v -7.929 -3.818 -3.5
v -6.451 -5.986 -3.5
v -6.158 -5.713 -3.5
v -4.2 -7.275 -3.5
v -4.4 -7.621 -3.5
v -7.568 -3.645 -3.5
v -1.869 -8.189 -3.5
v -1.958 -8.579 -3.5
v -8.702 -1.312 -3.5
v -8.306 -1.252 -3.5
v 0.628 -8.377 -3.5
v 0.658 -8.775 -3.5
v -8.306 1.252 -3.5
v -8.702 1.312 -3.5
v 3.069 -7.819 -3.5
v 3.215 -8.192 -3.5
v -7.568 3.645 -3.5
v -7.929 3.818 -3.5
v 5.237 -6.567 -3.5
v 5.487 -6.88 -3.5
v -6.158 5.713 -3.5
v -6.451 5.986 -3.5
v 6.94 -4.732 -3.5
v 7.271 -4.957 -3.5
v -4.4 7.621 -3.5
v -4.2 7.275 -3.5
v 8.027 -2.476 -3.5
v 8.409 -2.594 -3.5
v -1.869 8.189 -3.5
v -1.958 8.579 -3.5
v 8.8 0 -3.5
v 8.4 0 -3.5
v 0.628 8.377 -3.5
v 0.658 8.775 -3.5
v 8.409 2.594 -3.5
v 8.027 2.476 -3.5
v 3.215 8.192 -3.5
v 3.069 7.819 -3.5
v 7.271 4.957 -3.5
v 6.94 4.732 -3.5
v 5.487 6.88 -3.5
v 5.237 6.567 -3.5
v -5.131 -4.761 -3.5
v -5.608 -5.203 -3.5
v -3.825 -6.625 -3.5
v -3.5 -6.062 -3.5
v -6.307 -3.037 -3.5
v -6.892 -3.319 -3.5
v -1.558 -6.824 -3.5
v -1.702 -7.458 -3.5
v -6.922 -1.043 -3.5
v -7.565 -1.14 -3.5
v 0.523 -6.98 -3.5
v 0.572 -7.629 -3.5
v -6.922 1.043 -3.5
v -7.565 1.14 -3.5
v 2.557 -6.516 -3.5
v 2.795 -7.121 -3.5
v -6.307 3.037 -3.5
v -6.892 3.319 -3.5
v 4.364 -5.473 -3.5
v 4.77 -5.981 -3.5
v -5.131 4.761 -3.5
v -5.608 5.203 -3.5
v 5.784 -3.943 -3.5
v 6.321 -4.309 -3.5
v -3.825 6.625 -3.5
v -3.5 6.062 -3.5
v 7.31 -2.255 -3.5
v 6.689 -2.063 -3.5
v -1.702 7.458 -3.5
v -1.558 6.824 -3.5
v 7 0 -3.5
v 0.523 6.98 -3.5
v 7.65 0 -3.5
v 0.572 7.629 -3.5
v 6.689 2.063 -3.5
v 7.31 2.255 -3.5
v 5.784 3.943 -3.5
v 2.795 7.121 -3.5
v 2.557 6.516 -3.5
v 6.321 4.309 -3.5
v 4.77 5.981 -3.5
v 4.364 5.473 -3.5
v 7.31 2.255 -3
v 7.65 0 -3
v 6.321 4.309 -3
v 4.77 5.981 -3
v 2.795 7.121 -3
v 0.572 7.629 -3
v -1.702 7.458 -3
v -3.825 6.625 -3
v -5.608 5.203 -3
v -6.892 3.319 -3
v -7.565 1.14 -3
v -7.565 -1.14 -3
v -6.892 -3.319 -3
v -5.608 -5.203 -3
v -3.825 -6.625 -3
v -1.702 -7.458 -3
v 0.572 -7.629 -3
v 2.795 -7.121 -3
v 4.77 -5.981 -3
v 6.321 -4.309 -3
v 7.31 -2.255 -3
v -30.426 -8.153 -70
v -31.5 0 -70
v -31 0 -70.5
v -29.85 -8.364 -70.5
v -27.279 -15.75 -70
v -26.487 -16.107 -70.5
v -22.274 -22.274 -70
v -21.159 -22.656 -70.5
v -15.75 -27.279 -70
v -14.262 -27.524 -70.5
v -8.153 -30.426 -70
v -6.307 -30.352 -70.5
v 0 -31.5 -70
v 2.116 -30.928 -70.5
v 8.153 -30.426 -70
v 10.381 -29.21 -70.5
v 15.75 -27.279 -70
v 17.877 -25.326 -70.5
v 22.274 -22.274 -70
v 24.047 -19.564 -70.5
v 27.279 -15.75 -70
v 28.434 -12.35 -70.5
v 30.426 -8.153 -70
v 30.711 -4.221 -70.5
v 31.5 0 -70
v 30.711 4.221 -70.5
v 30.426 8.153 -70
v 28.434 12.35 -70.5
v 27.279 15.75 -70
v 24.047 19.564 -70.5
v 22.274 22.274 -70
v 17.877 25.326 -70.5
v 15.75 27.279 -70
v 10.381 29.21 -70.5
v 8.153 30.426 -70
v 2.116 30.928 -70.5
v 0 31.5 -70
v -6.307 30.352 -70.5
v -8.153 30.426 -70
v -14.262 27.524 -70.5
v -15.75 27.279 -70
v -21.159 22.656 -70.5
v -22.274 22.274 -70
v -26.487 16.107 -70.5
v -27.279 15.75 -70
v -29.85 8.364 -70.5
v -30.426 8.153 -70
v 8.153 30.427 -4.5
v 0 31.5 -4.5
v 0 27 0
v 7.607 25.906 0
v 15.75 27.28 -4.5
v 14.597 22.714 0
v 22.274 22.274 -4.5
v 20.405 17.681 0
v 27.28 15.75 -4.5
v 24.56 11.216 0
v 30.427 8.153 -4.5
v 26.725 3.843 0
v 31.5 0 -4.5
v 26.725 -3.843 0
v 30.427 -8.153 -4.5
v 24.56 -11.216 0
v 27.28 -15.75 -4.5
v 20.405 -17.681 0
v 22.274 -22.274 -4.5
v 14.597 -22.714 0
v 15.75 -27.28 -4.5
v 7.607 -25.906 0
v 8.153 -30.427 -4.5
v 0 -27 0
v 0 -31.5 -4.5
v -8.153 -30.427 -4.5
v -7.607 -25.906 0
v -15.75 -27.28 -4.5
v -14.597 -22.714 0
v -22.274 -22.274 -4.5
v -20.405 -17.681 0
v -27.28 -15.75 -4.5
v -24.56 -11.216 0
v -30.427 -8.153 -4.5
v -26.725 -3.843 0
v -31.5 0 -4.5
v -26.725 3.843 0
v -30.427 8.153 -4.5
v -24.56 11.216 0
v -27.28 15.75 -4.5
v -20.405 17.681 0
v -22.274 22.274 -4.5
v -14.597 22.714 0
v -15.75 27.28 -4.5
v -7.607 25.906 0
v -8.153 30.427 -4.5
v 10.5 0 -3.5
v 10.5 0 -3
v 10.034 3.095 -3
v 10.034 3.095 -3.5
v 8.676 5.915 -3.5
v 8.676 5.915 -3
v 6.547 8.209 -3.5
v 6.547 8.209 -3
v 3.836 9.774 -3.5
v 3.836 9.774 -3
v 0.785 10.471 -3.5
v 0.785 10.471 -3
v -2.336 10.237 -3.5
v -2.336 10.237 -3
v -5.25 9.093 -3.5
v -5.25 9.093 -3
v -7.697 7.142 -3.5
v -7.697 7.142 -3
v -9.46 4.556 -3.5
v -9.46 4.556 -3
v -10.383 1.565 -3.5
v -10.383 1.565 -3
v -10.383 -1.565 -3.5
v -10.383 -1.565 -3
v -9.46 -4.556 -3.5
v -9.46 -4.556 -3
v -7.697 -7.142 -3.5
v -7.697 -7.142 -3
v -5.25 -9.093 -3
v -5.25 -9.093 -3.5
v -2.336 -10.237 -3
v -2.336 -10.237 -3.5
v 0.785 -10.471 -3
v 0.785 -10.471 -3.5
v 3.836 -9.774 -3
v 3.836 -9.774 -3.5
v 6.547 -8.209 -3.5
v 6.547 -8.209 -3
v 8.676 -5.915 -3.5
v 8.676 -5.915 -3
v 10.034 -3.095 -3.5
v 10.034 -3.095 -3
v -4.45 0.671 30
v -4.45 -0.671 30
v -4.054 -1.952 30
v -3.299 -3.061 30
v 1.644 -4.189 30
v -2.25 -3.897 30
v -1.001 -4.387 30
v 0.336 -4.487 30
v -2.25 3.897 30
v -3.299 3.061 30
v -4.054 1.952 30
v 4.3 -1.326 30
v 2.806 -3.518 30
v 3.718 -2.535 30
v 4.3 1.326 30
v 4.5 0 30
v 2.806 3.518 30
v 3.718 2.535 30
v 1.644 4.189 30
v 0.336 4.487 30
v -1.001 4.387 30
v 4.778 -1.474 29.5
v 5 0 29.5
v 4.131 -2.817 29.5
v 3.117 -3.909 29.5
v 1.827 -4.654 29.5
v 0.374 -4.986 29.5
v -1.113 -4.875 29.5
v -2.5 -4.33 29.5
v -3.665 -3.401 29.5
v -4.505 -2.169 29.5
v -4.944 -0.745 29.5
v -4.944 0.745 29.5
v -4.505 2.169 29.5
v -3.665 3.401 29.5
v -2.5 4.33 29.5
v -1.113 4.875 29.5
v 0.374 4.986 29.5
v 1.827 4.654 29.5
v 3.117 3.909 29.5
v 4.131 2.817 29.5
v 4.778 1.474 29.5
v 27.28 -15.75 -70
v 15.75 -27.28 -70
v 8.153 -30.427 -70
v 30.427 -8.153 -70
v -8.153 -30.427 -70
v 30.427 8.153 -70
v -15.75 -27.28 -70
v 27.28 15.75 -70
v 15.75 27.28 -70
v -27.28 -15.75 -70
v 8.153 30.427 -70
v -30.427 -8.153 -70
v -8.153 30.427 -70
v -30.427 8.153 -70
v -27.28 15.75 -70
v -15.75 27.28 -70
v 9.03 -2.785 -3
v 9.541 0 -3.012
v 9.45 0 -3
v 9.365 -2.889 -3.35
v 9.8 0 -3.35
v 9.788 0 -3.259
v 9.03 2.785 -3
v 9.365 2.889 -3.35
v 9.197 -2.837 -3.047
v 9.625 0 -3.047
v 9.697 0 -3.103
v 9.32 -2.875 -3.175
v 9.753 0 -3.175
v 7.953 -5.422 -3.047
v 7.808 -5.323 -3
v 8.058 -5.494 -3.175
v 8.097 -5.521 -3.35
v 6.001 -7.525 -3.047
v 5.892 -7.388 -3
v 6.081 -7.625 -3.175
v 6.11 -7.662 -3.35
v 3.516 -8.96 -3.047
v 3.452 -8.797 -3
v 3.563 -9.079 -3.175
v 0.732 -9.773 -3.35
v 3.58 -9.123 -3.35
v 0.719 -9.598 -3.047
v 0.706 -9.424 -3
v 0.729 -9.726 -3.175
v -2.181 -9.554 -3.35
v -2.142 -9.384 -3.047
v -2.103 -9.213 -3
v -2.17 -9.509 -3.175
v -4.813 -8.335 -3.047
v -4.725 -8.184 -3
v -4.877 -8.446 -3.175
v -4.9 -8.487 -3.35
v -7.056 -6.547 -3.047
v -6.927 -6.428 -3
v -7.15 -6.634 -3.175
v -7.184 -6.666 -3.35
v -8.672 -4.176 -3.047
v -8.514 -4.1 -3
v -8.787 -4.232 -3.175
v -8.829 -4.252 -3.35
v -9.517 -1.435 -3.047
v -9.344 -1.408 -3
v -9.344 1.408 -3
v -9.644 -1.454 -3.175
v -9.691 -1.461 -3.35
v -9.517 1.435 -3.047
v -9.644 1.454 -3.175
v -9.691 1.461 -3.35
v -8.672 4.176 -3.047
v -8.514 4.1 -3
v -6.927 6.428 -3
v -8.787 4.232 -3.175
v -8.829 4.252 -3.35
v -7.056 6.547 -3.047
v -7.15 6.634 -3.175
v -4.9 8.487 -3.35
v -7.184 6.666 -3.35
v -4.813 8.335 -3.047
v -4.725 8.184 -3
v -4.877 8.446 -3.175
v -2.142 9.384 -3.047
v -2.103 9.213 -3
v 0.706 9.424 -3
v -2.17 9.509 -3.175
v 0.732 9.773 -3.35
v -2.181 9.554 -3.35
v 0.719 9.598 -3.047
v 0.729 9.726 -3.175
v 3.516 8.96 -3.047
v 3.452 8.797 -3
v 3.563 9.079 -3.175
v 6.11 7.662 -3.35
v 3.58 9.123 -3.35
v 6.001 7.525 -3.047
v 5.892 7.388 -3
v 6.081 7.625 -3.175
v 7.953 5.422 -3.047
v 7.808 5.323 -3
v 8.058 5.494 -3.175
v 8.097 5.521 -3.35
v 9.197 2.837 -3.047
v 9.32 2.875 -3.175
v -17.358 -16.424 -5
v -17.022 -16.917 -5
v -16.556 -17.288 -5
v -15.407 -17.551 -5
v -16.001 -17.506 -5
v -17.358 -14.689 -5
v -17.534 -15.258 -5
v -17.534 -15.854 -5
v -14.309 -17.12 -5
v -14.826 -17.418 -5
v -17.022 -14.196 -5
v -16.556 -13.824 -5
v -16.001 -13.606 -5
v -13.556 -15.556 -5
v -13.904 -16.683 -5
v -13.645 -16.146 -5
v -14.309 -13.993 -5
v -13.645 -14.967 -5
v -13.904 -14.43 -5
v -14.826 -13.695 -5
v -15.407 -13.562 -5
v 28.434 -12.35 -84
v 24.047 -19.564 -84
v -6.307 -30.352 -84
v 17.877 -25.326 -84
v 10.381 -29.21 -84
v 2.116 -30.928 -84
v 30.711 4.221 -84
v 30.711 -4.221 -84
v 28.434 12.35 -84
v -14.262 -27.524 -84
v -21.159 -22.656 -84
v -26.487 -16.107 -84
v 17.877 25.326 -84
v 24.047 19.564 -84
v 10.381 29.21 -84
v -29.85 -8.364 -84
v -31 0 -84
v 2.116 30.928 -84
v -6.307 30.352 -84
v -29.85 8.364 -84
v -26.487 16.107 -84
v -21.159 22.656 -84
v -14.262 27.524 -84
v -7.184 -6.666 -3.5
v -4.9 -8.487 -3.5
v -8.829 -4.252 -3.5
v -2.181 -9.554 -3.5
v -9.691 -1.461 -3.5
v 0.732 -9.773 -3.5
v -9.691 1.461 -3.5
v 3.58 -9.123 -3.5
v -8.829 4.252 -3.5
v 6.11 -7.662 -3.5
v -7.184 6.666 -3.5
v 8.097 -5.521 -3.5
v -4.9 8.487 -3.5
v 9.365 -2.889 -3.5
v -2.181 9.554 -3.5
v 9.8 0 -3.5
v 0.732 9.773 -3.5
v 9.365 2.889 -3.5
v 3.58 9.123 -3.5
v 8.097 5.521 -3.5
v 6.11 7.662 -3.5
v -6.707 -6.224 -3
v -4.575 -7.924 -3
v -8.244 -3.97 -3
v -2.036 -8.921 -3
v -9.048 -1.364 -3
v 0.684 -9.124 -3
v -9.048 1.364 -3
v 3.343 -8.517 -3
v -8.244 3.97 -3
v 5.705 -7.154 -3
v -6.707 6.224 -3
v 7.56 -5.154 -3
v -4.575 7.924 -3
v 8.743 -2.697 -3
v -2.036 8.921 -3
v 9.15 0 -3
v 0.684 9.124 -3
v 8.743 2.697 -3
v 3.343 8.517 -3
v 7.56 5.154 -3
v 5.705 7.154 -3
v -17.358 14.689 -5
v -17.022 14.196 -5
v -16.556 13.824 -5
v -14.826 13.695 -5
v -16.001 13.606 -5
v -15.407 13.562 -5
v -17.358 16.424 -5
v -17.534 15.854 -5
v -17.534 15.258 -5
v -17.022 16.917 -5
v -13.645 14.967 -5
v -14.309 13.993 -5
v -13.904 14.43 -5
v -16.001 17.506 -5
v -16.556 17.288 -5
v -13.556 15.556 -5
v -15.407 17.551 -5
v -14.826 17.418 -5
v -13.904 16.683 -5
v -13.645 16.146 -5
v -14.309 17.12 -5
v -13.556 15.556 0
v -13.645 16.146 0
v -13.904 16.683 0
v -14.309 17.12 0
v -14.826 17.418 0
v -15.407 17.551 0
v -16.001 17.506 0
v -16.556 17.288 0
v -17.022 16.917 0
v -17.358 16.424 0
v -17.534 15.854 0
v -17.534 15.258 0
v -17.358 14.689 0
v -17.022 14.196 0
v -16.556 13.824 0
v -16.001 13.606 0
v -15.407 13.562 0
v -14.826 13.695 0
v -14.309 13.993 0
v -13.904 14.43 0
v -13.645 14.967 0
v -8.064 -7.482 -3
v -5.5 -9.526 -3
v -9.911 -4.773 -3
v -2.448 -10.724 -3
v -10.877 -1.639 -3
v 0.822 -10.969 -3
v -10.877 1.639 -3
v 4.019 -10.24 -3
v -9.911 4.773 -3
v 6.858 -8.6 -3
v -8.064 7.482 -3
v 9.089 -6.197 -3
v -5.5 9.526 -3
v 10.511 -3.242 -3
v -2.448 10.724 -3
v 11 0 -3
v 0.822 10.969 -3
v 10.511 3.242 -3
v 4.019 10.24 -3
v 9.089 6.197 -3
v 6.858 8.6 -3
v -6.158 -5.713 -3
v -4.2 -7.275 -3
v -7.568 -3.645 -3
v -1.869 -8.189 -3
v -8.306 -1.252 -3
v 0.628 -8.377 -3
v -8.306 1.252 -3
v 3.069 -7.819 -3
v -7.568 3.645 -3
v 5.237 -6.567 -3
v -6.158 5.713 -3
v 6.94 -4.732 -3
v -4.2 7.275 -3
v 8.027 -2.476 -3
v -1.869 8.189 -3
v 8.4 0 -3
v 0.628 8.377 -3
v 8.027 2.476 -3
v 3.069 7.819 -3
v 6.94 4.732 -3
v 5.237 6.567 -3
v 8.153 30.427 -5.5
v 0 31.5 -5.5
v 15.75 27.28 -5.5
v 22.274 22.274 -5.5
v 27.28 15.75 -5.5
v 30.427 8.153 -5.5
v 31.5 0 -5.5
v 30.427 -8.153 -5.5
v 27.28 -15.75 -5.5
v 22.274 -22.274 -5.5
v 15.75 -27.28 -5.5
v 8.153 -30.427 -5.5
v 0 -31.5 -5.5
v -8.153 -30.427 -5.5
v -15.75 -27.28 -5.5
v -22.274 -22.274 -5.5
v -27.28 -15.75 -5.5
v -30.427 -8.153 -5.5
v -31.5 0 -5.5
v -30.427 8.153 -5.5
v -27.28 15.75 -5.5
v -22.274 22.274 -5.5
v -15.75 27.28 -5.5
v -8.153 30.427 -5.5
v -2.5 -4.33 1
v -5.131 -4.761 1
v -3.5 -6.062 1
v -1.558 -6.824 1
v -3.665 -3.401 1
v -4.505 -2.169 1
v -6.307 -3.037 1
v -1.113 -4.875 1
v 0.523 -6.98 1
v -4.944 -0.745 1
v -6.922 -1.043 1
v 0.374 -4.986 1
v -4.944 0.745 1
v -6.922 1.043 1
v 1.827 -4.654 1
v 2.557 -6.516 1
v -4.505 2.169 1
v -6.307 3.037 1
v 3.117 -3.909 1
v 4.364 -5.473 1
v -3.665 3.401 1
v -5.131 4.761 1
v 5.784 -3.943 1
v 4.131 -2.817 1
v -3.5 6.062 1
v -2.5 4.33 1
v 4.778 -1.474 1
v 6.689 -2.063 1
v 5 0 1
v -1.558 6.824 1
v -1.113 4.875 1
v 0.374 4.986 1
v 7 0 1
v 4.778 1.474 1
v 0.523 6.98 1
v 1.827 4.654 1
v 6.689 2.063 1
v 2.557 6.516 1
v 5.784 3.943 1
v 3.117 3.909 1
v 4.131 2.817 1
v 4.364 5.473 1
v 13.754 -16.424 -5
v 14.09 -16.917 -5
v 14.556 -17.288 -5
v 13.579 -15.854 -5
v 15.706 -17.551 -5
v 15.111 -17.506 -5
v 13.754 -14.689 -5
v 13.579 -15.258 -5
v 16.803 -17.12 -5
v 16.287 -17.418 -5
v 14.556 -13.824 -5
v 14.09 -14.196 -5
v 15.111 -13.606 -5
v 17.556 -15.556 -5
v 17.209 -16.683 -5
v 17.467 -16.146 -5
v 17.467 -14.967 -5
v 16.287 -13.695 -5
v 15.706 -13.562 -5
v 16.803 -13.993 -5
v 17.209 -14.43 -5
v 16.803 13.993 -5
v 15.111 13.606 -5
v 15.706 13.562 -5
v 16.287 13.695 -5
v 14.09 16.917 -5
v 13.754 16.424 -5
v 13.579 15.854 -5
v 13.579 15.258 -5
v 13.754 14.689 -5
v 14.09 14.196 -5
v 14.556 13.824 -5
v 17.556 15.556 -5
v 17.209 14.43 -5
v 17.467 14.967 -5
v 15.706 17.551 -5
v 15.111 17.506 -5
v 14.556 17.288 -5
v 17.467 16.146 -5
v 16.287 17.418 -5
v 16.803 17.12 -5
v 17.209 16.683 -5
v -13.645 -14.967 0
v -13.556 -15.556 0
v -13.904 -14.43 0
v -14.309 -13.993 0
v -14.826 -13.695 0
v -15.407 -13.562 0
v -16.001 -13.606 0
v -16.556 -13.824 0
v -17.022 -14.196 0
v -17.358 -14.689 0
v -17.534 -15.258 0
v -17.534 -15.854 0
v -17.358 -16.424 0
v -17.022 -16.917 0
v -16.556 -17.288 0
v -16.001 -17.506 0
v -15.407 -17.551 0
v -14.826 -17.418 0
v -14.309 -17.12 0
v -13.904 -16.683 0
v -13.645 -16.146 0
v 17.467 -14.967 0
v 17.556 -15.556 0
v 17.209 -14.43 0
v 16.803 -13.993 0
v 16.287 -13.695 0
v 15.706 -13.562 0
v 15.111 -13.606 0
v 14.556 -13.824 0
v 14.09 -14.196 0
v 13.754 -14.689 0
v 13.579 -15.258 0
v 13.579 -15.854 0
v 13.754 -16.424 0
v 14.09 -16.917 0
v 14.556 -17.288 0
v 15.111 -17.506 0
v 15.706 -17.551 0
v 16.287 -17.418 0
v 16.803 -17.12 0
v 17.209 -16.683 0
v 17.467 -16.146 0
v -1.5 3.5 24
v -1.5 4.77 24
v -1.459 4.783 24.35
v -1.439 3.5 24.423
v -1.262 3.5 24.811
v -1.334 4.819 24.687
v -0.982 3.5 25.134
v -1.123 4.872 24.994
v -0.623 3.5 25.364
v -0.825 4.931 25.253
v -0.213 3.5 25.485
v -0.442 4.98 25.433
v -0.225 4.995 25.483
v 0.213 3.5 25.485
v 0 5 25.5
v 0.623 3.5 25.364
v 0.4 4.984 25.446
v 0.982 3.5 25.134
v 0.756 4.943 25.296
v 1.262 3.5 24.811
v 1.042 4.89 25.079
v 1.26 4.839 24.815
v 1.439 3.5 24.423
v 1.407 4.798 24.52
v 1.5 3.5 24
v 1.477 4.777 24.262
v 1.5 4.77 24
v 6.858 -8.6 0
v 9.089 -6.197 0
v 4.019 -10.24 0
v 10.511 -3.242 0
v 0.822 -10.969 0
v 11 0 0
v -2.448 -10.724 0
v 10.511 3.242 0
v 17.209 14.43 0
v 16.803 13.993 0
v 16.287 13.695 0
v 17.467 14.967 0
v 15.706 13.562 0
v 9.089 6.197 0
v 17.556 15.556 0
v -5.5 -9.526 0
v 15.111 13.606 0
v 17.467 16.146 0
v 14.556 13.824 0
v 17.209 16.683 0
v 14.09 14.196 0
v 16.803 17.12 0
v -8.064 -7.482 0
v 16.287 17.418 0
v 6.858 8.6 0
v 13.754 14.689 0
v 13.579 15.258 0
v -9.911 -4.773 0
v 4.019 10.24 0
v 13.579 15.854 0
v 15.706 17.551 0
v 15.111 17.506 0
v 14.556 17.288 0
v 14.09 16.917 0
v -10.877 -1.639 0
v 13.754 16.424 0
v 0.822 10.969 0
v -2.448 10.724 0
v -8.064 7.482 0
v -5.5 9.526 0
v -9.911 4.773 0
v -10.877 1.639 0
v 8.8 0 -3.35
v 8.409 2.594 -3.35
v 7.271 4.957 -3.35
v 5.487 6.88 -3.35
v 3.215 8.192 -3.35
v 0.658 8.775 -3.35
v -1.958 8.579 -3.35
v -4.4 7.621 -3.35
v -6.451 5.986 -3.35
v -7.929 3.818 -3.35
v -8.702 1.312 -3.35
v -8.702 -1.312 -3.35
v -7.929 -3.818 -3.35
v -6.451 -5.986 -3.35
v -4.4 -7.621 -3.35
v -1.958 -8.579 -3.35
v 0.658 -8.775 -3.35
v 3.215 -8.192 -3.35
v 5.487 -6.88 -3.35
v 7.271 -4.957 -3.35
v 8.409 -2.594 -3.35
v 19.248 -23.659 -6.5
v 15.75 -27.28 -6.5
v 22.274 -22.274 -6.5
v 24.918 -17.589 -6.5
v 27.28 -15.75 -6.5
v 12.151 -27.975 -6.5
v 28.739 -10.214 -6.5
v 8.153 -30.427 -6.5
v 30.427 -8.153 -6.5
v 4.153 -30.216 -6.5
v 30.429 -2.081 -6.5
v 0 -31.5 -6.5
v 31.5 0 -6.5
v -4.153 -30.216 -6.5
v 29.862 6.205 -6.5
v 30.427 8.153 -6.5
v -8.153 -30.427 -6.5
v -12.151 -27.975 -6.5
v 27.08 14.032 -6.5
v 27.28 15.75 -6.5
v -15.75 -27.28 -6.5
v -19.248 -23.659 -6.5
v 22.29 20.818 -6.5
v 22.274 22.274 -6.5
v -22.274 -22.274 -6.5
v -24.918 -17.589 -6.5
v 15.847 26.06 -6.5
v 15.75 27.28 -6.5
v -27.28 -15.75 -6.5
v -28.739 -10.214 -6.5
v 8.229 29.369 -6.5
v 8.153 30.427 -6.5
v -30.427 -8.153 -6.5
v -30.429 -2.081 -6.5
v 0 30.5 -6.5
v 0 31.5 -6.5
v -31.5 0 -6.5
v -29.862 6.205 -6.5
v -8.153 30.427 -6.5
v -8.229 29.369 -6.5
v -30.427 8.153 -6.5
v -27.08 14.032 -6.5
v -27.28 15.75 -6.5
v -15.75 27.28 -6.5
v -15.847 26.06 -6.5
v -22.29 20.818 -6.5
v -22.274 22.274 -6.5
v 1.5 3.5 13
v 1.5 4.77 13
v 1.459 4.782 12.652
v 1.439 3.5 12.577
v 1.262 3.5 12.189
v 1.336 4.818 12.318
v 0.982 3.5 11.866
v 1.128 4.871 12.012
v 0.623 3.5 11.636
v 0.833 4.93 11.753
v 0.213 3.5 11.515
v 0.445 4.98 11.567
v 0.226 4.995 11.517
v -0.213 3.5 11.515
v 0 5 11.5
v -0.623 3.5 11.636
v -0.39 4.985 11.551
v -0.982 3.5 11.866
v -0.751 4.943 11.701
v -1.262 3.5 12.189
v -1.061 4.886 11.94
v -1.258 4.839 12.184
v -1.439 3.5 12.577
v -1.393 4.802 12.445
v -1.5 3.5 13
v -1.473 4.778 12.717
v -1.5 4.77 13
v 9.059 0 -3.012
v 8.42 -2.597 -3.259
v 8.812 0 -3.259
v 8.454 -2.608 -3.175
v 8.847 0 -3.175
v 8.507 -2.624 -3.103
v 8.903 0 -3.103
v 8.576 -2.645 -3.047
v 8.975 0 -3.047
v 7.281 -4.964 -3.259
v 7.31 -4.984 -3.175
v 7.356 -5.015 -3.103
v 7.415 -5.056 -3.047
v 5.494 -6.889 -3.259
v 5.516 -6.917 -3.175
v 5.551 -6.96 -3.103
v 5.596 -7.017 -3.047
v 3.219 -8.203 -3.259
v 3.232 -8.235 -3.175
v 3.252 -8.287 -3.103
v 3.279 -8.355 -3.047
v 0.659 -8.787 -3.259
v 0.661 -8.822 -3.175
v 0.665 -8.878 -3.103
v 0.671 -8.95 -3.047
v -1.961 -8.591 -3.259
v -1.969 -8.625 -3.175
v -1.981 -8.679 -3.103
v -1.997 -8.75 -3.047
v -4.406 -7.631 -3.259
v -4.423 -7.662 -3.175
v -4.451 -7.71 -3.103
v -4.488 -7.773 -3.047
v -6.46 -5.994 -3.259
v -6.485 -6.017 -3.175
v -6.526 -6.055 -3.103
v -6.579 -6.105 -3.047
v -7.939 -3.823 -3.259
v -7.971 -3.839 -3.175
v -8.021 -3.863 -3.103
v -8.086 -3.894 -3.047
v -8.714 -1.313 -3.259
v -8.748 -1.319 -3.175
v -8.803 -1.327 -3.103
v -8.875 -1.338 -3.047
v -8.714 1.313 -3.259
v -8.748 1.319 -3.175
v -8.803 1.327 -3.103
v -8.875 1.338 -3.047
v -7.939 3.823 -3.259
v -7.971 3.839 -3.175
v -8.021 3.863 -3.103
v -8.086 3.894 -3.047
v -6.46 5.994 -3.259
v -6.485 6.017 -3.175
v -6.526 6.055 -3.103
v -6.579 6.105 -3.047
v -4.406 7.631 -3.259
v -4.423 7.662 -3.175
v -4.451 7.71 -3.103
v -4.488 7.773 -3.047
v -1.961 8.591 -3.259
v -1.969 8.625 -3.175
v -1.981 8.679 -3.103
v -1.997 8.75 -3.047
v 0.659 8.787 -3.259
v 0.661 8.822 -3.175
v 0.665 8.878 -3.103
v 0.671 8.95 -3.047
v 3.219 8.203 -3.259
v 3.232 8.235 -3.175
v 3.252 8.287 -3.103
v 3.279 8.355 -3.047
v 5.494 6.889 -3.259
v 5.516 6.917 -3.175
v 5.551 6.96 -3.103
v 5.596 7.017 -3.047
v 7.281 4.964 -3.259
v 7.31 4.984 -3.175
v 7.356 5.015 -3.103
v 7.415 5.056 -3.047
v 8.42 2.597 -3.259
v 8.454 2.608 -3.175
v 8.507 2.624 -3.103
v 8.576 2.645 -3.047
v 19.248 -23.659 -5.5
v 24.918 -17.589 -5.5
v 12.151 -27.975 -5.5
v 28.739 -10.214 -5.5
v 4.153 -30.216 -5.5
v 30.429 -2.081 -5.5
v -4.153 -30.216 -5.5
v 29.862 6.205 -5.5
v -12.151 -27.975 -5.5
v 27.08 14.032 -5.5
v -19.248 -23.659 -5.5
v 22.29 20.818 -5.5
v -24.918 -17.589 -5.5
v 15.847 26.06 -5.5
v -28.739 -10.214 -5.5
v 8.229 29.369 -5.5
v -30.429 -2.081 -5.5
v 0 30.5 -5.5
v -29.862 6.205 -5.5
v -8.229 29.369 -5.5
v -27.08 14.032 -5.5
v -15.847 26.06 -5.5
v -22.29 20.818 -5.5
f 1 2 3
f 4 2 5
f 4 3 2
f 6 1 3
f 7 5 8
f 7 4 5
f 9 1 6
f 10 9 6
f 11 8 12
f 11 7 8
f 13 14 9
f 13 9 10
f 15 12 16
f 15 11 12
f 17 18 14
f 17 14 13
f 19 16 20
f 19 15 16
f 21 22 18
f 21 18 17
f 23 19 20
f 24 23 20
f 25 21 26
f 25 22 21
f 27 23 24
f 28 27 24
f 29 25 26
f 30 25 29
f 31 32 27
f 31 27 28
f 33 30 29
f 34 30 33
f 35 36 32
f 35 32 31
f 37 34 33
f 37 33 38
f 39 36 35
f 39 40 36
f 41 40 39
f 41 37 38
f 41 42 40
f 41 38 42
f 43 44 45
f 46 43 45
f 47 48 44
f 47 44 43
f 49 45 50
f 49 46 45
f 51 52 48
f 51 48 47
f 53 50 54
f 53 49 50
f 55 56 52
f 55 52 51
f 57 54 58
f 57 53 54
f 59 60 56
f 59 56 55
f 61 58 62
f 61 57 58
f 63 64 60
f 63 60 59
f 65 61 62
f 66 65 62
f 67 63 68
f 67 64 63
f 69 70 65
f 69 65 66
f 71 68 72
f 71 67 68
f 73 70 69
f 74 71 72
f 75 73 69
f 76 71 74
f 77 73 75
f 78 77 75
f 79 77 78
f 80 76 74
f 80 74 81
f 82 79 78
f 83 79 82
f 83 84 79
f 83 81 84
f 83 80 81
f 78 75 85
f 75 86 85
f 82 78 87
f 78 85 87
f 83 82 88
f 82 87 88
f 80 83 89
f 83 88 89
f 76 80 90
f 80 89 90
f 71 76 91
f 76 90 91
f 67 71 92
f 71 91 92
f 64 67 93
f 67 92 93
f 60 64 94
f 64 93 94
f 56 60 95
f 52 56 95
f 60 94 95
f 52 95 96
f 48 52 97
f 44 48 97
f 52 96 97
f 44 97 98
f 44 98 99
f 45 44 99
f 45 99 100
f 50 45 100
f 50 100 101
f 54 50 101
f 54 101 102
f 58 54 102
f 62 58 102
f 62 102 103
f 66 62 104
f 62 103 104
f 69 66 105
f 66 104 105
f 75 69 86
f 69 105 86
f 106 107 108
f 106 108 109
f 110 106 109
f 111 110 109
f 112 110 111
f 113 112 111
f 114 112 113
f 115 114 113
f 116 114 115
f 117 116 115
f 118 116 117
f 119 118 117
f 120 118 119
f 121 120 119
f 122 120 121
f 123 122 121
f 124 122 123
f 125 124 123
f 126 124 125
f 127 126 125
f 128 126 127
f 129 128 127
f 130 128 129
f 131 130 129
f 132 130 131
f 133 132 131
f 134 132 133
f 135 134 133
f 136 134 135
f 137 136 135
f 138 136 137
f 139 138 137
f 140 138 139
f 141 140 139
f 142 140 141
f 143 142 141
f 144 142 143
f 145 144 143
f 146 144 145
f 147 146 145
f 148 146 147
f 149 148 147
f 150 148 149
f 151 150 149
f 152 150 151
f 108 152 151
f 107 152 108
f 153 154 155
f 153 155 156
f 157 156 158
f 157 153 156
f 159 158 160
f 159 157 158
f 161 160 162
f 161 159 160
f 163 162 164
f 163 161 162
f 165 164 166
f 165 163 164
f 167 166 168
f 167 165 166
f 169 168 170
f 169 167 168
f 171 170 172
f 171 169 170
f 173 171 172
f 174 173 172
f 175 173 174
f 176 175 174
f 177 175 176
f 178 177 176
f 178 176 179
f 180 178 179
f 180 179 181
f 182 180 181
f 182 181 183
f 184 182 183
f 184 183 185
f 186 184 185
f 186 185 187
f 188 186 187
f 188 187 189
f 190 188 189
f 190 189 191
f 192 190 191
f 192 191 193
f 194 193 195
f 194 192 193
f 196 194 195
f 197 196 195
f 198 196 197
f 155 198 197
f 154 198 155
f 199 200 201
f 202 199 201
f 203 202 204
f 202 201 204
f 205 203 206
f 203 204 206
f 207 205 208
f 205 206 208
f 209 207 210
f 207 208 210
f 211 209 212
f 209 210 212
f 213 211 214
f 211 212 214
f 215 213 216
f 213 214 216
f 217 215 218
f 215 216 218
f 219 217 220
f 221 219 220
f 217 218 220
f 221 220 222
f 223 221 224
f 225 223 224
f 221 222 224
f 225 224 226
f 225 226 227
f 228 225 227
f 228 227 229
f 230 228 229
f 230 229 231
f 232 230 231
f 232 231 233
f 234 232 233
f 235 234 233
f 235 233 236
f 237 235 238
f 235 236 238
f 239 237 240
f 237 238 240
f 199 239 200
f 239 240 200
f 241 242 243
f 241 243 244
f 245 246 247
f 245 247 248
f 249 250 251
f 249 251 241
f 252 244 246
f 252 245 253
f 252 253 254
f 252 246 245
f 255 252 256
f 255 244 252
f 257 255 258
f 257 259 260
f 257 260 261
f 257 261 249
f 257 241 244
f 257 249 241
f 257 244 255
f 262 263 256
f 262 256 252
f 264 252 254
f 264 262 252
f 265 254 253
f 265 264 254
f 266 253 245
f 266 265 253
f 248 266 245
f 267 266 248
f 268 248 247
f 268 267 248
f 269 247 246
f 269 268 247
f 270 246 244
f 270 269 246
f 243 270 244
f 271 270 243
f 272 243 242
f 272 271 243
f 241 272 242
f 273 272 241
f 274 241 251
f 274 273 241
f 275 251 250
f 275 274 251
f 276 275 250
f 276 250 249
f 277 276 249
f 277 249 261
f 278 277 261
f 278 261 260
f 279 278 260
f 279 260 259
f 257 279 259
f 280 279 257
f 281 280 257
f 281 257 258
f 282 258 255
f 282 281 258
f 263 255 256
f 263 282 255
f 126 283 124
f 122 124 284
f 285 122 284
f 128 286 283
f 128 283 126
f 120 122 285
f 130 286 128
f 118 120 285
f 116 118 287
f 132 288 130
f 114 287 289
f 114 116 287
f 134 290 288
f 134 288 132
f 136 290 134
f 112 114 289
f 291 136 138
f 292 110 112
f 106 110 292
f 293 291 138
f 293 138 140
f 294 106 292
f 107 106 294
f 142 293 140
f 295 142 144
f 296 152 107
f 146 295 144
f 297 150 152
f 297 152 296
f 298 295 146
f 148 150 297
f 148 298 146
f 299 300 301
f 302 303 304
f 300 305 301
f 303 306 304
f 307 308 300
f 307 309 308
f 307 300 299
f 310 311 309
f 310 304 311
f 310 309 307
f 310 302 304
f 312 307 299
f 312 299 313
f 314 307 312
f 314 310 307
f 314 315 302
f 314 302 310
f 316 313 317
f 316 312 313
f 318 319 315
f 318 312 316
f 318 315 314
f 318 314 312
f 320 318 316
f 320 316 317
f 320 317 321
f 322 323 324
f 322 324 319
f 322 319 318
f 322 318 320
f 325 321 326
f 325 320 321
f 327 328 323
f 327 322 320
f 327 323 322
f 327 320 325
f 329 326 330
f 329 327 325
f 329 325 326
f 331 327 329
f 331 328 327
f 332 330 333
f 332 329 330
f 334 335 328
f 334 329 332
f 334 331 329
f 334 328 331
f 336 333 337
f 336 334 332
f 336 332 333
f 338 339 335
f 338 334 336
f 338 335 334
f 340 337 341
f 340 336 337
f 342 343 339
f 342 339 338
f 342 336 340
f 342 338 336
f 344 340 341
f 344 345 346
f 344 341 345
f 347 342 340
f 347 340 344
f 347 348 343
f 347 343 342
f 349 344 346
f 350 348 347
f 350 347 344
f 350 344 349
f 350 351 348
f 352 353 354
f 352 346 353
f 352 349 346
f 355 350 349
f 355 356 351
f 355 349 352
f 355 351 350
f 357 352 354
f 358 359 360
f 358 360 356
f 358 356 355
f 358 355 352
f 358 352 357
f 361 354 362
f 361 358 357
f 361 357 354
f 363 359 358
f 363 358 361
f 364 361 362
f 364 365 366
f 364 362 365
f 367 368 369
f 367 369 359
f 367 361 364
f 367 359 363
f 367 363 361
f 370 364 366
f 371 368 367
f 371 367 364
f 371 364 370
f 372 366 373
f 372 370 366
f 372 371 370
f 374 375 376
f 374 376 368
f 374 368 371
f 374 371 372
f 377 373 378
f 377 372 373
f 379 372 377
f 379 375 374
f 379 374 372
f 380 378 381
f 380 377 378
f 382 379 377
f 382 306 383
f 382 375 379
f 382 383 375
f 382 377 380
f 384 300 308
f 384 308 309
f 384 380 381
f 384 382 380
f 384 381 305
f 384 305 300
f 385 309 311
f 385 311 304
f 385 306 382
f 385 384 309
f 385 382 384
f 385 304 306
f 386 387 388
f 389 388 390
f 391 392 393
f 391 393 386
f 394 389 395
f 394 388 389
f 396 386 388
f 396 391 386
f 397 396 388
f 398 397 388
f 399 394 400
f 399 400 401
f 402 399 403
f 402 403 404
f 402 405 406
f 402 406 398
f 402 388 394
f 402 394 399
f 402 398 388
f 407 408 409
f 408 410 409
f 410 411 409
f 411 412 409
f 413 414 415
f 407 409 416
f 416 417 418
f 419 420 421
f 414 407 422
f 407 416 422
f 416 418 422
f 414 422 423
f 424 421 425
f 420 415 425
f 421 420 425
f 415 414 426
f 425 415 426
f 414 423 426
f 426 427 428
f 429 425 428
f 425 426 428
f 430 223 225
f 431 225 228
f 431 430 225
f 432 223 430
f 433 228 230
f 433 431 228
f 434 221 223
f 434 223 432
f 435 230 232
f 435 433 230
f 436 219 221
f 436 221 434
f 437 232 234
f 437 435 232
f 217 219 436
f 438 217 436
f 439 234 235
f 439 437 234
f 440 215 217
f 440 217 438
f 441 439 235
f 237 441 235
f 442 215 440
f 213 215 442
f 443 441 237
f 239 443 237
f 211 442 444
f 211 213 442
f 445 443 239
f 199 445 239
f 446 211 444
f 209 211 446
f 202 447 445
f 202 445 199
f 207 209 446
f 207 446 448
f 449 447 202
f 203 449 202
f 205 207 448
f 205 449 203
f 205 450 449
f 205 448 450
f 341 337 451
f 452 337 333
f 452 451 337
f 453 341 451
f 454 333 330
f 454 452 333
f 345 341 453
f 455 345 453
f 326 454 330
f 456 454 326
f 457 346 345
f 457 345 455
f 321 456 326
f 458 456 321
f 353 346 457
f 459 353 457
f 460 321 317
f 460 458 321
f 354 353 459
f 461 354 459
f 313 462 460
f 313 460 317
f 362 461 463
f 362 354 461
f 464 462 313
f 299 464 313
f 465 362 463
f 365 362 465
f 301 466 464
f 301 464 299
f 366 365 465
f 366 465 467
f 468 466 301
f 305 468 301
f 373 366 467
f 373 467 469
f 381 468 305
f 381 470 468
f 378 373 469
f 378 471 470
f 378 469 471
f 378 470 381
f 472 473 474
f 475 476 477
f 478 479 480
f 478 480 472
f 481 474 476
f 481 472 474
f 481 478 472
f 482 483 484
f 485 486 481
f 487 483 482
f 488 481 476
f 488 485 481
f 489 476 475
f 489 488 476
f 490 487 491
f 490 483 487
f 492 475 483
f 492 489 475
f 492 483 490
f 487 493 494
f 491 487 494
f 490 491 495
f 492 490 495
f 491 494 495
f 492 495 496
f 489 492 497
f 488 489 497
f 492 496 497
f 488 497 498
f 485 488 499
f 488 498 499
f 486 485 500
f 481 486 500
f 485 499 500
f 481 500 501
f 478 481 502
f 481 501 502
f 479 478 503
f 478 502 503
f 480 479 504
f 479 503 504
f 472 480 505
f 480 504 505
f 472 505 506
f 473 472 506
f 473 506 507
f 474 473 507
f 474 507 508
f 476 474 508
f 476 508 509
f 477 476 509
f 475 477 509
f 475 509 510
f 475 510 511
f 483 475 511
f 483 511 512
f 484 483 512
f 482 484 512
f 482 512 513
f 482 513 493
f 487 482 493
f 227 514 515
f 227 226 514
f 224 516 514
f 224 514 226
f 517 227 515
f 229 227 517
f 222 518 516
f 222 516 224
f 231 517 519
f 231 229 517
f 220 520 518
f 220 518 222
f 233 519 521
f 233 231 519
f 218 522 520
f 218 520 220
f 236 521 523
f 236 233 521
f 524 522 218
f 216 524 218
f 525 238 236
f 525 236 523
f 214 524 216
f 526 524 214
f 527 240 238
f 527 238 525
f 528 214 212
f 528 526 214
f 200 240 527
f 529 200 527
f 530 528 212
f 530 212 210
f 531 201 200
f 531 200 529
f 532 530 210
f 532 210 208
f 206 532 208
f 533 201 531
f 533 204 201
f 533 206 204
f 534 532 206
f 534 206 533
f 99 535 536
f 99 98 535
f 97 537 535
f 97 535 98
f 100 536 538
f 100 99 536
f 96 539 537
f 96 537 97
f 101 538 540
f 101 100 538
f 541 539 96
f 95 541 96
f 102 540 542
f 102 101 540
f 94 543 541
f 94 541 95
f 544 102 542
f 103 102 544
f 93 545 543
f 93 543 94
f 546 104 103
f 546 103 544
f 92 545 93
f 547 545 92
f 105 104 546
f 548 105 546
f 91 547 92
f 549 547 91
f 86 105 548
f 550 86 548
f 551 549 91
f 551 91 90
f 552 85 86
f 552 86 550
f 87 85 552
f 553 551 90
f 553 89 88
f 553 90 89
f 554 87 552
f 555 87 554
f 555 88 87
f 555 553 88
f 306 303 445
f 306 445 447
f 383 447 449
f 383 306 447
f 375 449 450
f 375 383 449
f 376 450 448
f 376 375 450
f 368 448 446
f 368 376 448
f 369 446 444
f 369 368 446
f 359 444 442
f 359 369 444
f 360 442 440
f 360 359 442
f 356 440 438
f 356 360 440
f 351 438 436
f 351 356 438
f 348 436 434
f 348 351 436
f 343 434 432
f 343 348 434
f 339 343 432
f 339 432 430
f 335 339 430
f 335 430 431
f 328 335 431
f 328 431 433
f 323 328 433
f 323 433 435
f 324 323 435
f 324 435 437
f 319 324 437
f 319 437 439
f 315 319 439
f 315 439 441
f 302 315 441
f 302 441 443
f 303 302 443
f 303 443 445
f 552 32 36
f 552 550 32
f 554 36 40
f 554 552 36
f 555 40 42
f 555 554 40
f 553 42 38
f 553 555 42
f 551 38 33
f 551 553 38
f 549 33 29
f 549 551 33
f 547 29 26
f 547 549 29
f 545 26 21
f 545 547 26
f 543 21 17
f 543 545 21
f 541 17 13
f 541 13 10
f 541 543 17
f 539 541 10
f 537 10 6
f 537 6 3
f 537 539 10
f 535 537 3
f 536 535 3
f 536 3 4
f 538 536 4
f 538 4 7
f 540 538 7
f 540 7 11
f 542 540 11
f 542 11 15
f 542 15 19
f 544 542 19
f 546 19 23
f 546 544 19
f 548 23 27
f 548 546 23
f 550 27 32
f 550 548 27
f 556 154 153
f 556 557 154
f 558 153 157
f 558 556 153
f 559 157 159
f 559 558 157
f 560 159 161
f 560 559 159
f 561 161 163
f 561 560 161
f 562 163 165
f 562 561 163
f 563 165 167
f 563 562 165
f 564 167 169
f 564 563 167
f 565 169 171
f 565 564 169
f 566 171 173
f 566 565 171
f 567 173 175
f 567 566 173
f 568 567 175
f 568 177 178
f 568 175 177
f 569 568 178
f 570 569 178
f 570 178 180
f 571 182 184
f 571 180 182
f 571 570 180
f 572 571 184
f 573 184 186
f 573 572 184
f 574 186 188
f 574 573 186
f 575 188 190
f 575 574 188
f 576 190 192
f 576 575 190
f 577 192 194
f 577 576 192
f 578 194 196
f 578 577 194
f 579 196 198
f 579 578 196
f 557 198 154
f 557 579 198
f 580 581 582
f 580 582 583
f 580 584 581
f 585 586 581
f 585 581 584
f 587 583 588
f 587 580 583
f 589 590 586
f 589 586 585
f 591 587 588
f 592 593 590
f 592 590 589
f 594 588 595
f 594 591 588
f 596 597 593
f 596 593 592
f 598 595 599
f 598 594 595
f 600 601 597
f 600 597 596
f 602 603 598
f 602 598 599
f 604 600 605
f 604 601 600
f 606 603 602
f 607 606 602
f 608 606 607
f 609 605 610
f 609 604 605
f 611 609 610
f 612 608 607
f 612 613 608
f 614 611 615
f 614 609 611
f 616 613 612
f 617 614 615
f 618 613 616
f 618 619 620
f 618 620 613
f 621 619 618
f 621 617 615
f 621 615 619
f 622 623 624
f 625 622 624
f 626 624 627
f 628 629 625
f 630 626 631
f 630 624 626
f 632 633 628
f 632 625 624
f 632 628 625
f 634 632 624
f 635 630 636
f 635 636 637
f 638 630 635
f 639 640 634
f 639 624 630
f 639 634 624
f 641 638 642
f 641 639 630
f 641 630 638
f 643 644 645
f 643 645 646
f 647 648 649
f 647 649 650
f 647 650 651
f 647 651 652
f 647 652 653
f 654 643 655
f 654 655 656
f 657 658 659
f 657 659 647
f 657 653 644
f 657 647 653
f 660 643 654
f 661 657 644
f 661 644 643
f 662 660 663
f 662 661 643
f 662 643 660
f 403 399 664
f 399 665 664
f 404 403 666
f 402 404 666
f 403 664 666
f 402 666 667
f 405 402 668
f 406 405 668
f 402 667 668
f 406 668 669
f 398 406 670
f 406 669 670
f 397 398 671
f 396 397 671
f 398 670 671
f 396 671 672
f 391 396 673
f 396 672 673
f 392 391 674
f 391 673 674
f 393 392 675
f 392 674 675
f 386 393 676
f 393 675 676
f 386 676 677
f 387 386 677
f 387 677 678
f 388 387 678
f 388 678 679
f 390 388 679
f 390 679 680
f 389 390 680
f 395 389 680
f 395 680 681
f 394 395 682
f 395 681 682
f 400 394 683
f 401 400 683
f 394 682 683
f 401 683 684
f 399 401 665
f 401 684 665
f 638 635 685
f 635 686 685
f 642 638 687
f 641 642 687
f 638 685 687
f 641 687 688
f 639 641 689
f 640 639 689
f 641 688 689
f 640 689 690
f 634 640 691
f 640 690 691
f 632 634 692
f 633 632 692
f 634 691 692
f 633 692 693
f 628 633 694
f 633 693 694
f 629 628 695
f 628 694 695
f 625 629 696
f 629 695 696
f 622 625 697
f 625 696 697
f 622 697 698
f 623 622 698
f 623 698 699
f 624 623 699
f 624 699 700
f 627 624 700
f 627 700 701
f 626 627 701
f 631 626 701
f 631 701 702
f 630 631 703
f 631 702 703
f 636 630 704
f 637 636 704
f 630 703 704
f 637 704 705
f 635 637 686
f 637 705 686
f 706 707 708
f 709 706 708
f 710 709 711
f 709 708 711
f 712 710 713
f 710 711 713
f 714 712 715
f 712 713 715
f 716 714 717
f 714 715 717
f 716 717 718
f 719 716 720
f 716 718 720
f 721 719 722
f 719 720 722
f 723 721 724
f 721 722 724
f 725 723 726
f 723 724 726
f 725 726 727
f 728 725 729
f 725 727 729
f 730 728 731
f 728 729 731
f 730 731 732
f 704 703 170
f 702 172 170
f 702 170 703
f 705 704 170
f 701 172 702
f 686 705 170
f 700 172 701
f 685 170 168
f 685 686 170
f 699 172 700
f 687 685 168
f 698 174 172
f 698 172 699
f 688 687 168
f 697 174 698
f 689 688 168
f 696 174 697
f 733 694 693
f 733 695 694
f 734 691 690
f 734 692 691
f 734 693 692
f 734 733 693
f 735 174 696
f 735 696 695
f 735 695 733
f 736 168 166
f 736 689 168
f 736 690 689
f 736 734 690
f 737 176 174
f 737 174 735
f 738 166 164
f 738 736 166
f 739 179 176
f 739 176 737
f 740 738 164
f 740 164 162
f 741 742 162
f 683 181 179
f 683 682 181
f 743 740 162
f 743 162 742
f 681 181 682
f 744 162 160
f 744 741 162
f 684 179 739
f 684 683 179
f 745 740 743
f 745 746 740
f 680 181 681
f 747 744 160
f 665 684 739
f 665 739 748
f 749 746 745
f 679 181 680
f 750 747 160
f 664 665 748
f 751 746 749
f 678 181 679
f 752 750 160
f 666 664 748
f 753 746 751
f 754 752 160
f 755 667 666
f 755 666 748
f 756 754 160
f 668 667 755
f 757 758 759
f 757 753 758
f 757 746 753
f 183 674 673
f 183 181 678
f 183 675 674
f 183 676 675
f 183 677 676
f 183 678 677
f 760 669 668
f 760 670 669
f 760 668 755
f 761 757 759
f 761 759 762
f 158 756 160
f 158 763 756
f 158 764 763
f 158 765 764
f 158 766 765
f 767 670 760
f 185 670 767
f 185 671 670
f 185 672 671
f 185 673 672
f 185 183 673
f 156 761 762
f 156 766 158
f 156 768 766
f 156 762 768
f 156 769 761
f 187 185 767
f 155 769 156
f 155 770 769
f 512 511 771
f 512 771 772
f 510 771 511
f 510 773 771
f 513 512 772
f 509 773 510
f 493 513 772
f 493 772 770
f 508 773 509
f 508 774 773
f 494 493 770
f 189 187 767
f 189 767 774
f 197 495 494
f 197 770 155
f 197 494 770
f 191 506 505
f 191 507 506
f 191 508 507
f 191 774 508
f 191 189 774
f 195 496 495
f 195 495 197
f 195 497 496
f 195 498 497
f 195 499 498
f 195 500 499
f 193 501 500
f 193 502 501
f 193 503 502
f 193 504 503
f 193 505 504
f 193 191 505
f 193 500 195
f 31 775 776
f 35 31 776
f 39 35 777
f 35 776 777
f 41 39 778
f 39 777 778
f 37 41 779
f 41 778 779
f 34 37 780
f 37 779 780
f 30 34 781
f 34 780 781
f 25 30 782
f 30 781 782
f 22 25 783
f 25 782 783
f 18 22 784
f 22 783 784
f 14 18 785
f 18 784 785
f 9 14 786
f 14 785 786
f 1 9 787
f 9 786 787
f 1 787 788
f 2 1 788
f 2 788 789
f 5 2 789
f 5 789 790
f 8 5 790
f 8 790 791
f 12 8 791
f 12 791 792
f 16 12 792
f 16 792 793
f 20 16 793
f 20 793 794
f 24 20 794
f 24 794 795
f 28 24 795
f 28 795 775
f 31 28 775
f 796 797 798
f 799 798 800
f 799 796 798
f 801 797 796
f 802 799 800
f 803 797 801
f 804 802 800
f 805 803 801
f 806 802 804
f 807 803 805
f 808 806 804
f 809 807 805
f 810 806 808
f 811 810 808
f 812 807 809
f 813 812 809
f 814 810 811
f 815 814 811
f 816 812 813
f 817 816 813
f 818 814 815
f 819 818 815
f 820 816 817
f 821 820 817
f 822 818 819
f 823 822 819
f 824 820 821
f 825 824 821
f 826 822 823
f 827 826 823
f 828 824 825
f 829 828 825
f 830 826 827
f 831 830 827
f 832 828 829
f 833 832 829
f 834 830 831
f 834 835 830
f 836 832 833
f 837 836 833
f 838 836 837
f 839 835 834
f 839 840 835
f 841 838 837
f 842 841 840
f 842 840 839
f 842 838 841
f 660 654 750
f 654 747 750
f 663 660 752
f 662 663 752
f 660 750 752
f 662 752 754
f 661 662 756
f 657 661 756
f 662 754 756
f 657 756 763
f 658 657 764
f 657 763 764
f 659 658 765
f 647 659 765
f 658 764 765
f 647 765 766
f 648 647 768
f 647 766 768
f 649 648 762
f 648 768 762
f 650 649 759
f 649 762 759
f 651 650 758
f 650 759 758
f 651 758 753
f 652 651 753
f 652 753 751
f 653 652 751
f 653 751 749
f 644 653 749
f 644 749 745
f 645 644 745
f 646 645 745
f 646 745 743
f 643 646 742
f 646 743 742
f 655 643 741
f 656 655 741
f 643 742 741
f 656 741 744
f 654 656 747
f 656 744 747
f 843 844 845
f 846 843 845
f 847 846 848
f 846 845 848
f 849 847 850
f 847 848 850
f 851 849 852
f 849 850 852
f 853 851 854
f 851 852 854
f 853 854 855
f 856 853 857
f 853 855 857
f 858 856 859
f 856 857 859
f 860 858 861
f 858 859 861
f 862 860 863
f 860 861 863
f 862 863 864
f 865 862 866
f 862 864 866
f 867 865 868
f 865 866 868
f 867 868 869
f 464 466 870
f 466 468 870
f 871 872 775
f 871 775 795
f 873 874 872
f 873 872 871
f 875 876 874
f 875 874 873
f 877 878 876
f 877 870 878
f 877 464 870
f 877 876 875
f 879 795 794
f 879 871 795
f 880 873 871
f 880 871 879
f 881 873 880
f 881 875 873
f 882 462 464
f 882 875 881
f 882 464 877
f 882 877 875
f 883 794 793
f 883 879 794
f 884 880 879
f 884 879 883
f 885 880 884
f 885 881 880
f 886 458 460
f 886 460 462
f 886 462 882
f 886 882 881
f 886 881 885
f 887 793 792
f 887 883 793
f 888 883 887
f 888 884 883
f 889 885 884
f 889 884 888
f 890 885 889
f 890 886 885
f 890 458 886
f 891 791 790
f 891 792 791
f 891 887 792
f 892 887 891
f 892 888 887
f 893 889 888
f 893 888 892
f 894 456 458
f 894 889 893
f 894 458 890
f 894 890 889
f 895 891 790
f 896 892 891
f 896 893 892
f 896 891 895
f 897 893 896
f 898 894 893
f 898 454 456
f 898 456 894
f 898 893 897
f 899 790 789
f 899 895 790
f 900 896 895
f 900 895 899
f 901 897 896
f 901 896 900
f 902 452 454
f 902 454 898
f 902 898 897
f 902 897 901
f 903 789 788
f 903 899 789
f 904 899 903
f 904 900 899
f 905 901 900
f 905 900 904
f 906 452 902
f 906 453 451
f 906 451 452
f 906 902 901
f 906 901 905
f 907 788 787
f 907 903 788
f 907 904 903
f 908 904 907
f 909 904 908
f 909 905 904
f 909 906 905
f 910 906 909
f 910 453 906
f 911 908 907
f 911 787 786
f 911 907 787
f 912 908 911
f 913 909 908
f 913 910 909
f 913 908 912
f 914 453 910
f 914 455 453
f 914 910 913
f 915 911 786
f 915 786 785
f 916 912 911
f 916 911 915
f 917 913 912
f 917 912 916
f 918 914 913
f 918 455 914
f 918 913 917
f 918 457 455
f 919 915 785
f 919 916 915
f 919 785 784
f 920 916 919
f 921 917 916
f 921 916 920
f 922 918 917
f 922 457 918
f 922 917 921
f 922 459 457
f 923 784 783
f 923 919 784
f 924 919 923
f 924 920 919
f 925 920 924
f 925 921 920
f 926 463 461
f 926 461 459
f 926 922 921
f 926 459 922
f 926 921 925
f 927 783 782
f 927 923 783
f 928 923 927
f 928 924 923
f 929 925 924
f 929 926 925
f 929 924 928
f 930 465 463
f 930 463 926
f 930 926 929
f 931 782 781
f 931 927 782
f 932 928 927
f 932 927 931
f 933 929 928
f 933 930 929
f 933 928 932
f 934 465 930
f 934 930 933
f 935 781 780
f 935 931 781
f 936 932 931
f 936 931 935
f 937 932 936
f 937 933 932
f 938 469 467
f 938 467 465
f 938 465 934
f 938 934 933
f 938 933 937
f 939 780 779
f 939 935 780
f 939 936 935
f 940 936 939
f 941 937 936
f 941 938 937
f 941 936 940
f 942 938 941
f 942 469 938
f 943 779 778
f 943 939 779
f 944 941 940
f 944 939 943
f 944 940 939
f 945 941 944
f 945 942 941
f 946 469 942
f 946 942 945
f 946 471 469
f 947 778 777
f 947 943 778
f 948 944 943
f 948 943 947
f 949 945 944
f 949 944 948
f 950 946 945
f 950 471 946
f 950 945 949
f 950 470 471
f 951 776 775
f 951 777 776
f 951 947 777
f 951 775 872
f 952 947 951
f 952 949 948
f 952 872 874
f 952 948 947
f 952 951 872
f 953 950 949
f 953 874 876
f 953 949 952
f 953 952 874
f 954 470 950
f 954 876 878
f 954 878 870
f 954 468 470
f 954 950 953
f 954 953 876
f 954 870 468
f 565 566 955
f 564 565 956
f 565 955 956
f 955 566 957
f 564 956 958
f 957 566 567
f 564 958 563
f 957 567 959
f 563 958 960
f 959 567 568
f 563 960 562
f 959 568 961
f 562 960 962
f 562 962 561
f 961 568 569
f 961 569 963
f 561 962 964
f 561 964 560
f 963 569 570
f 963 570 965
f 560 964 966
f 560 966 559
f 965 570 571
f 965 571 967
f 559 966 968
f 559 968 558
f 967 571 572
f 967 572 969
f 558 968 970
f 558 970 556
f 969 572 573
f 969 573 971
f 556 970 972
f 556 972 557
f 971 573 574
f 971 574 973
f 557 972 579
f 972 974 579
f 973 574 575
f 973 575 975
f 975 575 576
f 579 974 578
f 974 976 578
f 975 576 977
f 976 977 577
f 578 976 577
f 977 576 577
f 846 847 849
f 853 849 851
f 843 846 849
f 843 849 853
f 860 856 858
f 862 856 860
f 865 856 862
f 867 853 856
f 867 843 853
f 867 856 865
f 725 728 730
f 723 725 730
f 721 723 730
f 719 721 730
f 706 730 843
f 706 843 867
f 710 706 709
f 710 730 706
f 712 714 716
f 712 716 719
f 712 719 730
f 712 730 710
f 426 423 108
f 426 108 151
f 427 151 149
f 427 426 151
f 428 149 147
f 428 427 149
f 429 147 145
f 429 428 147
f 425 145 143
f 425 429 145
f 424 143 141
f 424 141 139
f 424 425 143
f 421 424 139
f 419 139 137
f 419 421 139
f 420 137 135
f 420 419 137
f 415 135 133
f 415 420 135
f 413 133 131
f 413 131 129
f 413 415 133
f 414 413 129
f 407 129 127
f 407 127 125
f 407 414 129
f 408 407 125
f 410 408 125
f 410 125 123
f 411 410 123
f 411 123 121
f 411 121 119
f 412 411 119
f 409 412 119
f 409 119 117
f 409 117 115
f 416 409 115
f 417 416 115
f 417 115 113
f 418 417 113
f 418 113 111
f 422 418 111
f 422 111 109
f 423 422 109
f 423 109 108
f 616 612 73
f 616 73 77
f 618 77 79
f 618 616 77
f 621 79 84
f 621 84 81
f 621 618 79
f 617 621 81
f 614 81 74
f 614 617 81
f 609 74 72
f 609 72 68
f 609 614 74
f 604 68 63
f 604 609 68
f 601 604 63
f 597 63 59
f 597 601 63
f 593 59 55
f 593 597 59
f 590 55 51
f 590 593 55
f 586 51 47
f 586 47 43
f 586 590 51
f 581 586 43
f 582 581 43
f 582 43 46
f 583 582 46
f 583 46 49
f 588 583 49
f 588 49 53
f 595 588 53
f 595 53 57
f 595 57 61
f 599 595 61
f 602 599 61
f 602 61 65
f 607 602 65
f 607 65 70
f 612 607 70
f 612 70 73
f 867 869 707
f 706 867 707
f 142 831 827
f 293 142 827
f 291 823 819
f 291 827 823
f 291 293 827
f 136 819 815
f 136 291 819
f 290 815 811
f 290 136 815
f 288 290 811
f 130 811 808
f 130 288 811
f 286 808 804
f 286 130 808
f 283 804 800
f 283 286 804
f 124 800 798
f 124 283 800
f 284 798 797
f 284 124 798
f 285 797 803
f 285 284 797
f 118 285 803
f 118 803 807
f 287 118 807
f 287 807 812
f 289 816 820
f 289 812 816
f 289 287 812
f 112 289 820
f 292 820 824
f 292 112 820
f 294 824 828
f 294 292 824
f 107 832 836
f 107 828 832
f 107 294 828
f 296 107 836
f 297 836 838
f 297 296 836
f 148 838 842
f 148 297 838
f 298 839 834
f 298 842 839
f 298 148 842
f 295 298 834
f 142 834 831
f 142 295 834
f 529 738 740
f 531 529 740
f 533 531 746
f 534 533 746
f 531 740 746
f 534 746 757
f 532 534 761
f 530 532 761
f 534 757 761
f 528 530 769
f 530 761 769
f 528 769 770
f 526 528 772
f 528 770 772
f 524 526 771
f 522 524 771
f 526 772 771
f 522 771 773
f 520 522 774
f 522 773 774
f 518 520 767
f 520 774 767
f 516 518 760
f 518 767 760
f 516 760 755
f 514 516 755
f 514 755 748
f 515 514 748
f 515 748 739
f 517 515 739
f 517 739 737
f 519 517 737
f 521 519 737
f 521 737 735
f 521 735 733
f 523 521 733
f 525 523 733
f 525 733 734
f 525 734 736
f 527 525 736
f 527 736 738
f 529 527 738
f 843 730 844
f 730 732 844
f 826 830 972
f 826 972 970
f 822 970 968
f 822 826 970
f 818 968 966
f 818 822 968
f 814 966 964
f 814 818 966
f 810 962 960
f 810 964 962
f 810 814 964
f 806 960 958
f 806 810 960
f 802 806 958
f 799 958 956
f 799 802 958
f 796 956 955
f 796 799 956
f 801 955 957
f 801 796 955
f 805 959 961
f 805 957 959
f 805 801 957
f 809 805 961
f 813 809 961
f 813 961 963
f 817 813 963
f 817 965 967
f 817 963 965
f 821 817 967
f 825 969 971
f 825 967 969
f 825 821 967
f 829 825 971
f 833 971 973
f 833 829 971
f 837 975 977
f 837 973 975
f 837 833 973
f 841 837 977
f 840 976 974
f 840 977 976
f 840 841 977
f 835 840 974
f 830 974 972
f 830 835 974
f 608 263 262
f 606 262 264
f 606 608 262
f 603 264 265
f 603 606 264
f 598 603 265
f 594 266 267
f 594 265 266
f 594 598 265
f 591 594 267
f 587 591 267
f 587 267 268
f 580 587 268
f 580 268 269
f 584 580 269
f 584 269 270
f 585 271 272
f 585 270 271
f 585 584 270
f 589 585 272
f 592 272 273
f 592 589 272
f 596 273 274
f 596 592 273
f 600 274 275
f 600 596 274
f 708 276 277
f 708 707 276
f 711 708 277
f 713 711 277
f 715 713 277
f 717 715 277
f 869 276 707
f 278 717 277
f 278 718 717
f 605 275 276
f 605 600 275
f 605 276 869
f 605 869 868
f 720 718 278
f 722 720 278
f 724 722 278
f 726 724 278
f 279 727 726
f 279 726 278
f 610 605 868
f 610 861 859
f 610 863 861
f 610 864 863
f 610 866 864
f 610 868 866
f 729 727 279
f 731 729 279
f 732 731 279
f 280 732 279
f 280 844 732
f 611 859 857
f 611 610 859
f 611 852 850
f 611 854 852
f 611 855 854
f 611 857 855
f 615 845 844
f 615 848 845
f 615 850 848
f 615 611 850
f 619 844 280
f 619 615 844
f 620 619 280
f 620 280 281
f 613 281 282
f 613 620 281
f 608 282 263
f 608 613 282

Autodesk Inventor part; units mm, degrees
ref_plane "YZ Plane" through (0, 0, 0) normal (1, 0, 0) x (0, 1, 0)
sketch "Sketch1" plane through (0, 0, 0) normal (1, 0, 0) x (0, 1, 0)
  line L0 (27, 0) -> (0, 0)
  line L1 (27, 0) -> (31.5, -4.5)
  line L2 (31.5, -4.5) -> (31.5, -5.5)
  line L3 (27, 0) -> (27, -13.1503) construction
  line L4 (31.5, -5.5) -> (30.5, -5.5)
  line L5 (30.5, -5.5) -> (30.5, -6.5)
  line L6 (30.5, -6.5) -> (31.5, -6.5)
  line L7 (31.5, -6.5) -> (31.5, -84)
  line L8 (31.5, -84) -> (0, -84)
  line L9 (0, -84) -> (0, 0)
  dimension "d0" = 27
  dimension "d1" = 31.5
  dimension "d2" = 45
  dimension "d5" = 1
  dimension "d6" = 1
  dimension "d7" = 1
  dimension "d8" = 1
  dimension "d9" = 84
revolve "Revolution1" add sketch "Sketch1" angle 360 about axis through (0, 0, -84) along (0, 0, 1)
sketch "Sketch2" plane through (0, 0, 0) normal (0, 0, 1) x (1, 0, 0)
  circle A0 centre (-15.5563, 15.5563) radius 2
  line L0 (-15.5563, 15.5563) -> (0, 0) construction
  line L1 (0, 0) -> (-12.1027, 0) construction
  circle A1 centre (-15.5563, -15.5563) radius 2
  circle A2 centre (15.5563, -15.5563) radius 2
  circle A3 centre (15.5563, 15.5563) radius 2
  dimension "d11" = 4
  dimension "d12" = 22
  dimension "d13" = 45
  dimension "d16" = 360
extrude "Extrusion1" cut sketch "Sketch2" against normal blind 5
thread "Thread1" size "M4x0.7" class "6H" standard "ANSI Metric M Profile" full length
thread "Thread2" size "M4x0.7" class "6H" standard "ANSI Metric M Profile" full length
thread "Thread3" size "M4x0.7" class "6H" standard "ANSI Metric M Profile" full length
thread "Thread4" size "M4x0.7" class "6H" standard "ANSI Metric M Profile" full length
sketch "Sketch3" plane through (0, 0, 0) normal (0, 0, 1) x (1, 0, 0)
  circle A0 centre (0, 0) radius 5
  dimension "d28" = 10
extrude "Extrusion2" add sketch "Sketch3" along normal blind 30
chamfer "Chamfer1" distance 0.5 angle 45 1 edges at (-5, 0, 30)
ref_plane "Work Plane1" through (0, 5, 0) normal (0, 1, 0) x (-1, 0, 0)
sketch "Sketch4" plane through (0, 5, 0) normal (0, 1, 0) x (-1, 0, 0)
  line L0 (0, 13) -> (0, 24) construction
  line L1 (1.5, 13) -> (1.5, 24)
  line L2 (-1.5, 24) -> (-1.5, 13)
  arc A0 (-1.5, 13) -> (1.5, 13) centre (0, 13) ccw
  arc A1 (1.5, 24) -> (-1.5, 24) centre (0, 24) ccw
  line L3 (5, 29.5) -> (-5, 29.5) construction
  point P0 (0, 0)
  point P1 (0, 18.5)
  point P2 (0, 29.5)
  point P3 (0, 25.5)
  dimension "d35" = 11
  dimension "d36" = 3
  dimension "d37" = 4
extrude "Extrusion3" cut sketch "Sketch4" against normal blind 1.5
ref_plane "Work Plane2" through (0, 36, 0) normal (0, 1, 0) x (-1, 0, 0)
sketch "Sketch5" plane through (0, 36, 0) normal (0, 1, 0) x (-1, 0, 0)
  line L0 (14.1999, -66.6752) -> (-12.4029, -66.6752) construction
  line L1 (-12.4029, -66.6752) -> (-12.4029, -14.1495) construction
  line L2 (-12.4029, -14.1495) -> (14.1999, -14.1495) construction
  line L3 (14.1999, -14.1495) -> (14.1999, -66.6752) construction
  point P0 (0, 0)
decal "Decal1"
sketch "Sketch6" plane through (0, 0, -84) normal (0, 0, -1) x (-1, 0, 0)
  circle A0 centre (0, 0) radius 31.5 projected
  circle A1 centre (0, 0) radius 31
  dimension "d52" = 0.5
extrude "Extrusion4" cut sketch "Sketch6" against normal blind 14
chamfer "Chamfer2" distance 0.5 angle 45 1 edges at (31, 0, -70)
sketch "Sketch7" plane through (0, 0, 0) normal (0, 0, 1) x (1, 0, 0)
  circle A0 centre (0, 0) radius 11
  dimension "d58" = 22
extrude "Extrusion5" cut sketch "Sketch7" against normal blind 3
sketch "Sketch8" plane through (0, 0, -3) normal (0, 0, 1) x (1, 0, 0)
  circle A0 centre (0, 0) radius 7
  dimension "d61" = 14
extrude "Extrusion6" add sketch "Sketch8" along normal blind 4
sketch "Sketch9" plane through (0, 0, -3) normal (0, 0, 1) x (1, 0, 0)
  circle A0 centre (0, 0) radius 11 projected
  circle A1 centre (0, 0) radius 10.5
  circle A2 centre (0, 0) radius 9.8
  circle A3 centre (0, 0) radius 8.8
  circle A4 centre (0, 0) radius 8.4
  circle A5 centre (0, 0) radius 7.65
  circle A6 centre (0, 0) radius 7 projected
  dimension "d64" = 0.5
  dimension "d65" = 0.7
  dimension "d66" = 1
  dimension "d69" = 0.4
  dimension "d70" = 0.75
extrude "Extrusion7" cut sketch "Sketch9" against normal blind 0.5 contours A1
extrude "Extrusion8" cut sketch "Sketch9" against normal blind 0.5 contours A3
fillet "Fillet1" radius 0.35 2 edges at (-9.8, 0, -3) (-8.8, 0, -3)
extrude "Extrusion9" cut sketch "Sketch9" against normal blind 0.5 contours A5
properties part number "Flipsky E-Board Motor 6384 190KV"
